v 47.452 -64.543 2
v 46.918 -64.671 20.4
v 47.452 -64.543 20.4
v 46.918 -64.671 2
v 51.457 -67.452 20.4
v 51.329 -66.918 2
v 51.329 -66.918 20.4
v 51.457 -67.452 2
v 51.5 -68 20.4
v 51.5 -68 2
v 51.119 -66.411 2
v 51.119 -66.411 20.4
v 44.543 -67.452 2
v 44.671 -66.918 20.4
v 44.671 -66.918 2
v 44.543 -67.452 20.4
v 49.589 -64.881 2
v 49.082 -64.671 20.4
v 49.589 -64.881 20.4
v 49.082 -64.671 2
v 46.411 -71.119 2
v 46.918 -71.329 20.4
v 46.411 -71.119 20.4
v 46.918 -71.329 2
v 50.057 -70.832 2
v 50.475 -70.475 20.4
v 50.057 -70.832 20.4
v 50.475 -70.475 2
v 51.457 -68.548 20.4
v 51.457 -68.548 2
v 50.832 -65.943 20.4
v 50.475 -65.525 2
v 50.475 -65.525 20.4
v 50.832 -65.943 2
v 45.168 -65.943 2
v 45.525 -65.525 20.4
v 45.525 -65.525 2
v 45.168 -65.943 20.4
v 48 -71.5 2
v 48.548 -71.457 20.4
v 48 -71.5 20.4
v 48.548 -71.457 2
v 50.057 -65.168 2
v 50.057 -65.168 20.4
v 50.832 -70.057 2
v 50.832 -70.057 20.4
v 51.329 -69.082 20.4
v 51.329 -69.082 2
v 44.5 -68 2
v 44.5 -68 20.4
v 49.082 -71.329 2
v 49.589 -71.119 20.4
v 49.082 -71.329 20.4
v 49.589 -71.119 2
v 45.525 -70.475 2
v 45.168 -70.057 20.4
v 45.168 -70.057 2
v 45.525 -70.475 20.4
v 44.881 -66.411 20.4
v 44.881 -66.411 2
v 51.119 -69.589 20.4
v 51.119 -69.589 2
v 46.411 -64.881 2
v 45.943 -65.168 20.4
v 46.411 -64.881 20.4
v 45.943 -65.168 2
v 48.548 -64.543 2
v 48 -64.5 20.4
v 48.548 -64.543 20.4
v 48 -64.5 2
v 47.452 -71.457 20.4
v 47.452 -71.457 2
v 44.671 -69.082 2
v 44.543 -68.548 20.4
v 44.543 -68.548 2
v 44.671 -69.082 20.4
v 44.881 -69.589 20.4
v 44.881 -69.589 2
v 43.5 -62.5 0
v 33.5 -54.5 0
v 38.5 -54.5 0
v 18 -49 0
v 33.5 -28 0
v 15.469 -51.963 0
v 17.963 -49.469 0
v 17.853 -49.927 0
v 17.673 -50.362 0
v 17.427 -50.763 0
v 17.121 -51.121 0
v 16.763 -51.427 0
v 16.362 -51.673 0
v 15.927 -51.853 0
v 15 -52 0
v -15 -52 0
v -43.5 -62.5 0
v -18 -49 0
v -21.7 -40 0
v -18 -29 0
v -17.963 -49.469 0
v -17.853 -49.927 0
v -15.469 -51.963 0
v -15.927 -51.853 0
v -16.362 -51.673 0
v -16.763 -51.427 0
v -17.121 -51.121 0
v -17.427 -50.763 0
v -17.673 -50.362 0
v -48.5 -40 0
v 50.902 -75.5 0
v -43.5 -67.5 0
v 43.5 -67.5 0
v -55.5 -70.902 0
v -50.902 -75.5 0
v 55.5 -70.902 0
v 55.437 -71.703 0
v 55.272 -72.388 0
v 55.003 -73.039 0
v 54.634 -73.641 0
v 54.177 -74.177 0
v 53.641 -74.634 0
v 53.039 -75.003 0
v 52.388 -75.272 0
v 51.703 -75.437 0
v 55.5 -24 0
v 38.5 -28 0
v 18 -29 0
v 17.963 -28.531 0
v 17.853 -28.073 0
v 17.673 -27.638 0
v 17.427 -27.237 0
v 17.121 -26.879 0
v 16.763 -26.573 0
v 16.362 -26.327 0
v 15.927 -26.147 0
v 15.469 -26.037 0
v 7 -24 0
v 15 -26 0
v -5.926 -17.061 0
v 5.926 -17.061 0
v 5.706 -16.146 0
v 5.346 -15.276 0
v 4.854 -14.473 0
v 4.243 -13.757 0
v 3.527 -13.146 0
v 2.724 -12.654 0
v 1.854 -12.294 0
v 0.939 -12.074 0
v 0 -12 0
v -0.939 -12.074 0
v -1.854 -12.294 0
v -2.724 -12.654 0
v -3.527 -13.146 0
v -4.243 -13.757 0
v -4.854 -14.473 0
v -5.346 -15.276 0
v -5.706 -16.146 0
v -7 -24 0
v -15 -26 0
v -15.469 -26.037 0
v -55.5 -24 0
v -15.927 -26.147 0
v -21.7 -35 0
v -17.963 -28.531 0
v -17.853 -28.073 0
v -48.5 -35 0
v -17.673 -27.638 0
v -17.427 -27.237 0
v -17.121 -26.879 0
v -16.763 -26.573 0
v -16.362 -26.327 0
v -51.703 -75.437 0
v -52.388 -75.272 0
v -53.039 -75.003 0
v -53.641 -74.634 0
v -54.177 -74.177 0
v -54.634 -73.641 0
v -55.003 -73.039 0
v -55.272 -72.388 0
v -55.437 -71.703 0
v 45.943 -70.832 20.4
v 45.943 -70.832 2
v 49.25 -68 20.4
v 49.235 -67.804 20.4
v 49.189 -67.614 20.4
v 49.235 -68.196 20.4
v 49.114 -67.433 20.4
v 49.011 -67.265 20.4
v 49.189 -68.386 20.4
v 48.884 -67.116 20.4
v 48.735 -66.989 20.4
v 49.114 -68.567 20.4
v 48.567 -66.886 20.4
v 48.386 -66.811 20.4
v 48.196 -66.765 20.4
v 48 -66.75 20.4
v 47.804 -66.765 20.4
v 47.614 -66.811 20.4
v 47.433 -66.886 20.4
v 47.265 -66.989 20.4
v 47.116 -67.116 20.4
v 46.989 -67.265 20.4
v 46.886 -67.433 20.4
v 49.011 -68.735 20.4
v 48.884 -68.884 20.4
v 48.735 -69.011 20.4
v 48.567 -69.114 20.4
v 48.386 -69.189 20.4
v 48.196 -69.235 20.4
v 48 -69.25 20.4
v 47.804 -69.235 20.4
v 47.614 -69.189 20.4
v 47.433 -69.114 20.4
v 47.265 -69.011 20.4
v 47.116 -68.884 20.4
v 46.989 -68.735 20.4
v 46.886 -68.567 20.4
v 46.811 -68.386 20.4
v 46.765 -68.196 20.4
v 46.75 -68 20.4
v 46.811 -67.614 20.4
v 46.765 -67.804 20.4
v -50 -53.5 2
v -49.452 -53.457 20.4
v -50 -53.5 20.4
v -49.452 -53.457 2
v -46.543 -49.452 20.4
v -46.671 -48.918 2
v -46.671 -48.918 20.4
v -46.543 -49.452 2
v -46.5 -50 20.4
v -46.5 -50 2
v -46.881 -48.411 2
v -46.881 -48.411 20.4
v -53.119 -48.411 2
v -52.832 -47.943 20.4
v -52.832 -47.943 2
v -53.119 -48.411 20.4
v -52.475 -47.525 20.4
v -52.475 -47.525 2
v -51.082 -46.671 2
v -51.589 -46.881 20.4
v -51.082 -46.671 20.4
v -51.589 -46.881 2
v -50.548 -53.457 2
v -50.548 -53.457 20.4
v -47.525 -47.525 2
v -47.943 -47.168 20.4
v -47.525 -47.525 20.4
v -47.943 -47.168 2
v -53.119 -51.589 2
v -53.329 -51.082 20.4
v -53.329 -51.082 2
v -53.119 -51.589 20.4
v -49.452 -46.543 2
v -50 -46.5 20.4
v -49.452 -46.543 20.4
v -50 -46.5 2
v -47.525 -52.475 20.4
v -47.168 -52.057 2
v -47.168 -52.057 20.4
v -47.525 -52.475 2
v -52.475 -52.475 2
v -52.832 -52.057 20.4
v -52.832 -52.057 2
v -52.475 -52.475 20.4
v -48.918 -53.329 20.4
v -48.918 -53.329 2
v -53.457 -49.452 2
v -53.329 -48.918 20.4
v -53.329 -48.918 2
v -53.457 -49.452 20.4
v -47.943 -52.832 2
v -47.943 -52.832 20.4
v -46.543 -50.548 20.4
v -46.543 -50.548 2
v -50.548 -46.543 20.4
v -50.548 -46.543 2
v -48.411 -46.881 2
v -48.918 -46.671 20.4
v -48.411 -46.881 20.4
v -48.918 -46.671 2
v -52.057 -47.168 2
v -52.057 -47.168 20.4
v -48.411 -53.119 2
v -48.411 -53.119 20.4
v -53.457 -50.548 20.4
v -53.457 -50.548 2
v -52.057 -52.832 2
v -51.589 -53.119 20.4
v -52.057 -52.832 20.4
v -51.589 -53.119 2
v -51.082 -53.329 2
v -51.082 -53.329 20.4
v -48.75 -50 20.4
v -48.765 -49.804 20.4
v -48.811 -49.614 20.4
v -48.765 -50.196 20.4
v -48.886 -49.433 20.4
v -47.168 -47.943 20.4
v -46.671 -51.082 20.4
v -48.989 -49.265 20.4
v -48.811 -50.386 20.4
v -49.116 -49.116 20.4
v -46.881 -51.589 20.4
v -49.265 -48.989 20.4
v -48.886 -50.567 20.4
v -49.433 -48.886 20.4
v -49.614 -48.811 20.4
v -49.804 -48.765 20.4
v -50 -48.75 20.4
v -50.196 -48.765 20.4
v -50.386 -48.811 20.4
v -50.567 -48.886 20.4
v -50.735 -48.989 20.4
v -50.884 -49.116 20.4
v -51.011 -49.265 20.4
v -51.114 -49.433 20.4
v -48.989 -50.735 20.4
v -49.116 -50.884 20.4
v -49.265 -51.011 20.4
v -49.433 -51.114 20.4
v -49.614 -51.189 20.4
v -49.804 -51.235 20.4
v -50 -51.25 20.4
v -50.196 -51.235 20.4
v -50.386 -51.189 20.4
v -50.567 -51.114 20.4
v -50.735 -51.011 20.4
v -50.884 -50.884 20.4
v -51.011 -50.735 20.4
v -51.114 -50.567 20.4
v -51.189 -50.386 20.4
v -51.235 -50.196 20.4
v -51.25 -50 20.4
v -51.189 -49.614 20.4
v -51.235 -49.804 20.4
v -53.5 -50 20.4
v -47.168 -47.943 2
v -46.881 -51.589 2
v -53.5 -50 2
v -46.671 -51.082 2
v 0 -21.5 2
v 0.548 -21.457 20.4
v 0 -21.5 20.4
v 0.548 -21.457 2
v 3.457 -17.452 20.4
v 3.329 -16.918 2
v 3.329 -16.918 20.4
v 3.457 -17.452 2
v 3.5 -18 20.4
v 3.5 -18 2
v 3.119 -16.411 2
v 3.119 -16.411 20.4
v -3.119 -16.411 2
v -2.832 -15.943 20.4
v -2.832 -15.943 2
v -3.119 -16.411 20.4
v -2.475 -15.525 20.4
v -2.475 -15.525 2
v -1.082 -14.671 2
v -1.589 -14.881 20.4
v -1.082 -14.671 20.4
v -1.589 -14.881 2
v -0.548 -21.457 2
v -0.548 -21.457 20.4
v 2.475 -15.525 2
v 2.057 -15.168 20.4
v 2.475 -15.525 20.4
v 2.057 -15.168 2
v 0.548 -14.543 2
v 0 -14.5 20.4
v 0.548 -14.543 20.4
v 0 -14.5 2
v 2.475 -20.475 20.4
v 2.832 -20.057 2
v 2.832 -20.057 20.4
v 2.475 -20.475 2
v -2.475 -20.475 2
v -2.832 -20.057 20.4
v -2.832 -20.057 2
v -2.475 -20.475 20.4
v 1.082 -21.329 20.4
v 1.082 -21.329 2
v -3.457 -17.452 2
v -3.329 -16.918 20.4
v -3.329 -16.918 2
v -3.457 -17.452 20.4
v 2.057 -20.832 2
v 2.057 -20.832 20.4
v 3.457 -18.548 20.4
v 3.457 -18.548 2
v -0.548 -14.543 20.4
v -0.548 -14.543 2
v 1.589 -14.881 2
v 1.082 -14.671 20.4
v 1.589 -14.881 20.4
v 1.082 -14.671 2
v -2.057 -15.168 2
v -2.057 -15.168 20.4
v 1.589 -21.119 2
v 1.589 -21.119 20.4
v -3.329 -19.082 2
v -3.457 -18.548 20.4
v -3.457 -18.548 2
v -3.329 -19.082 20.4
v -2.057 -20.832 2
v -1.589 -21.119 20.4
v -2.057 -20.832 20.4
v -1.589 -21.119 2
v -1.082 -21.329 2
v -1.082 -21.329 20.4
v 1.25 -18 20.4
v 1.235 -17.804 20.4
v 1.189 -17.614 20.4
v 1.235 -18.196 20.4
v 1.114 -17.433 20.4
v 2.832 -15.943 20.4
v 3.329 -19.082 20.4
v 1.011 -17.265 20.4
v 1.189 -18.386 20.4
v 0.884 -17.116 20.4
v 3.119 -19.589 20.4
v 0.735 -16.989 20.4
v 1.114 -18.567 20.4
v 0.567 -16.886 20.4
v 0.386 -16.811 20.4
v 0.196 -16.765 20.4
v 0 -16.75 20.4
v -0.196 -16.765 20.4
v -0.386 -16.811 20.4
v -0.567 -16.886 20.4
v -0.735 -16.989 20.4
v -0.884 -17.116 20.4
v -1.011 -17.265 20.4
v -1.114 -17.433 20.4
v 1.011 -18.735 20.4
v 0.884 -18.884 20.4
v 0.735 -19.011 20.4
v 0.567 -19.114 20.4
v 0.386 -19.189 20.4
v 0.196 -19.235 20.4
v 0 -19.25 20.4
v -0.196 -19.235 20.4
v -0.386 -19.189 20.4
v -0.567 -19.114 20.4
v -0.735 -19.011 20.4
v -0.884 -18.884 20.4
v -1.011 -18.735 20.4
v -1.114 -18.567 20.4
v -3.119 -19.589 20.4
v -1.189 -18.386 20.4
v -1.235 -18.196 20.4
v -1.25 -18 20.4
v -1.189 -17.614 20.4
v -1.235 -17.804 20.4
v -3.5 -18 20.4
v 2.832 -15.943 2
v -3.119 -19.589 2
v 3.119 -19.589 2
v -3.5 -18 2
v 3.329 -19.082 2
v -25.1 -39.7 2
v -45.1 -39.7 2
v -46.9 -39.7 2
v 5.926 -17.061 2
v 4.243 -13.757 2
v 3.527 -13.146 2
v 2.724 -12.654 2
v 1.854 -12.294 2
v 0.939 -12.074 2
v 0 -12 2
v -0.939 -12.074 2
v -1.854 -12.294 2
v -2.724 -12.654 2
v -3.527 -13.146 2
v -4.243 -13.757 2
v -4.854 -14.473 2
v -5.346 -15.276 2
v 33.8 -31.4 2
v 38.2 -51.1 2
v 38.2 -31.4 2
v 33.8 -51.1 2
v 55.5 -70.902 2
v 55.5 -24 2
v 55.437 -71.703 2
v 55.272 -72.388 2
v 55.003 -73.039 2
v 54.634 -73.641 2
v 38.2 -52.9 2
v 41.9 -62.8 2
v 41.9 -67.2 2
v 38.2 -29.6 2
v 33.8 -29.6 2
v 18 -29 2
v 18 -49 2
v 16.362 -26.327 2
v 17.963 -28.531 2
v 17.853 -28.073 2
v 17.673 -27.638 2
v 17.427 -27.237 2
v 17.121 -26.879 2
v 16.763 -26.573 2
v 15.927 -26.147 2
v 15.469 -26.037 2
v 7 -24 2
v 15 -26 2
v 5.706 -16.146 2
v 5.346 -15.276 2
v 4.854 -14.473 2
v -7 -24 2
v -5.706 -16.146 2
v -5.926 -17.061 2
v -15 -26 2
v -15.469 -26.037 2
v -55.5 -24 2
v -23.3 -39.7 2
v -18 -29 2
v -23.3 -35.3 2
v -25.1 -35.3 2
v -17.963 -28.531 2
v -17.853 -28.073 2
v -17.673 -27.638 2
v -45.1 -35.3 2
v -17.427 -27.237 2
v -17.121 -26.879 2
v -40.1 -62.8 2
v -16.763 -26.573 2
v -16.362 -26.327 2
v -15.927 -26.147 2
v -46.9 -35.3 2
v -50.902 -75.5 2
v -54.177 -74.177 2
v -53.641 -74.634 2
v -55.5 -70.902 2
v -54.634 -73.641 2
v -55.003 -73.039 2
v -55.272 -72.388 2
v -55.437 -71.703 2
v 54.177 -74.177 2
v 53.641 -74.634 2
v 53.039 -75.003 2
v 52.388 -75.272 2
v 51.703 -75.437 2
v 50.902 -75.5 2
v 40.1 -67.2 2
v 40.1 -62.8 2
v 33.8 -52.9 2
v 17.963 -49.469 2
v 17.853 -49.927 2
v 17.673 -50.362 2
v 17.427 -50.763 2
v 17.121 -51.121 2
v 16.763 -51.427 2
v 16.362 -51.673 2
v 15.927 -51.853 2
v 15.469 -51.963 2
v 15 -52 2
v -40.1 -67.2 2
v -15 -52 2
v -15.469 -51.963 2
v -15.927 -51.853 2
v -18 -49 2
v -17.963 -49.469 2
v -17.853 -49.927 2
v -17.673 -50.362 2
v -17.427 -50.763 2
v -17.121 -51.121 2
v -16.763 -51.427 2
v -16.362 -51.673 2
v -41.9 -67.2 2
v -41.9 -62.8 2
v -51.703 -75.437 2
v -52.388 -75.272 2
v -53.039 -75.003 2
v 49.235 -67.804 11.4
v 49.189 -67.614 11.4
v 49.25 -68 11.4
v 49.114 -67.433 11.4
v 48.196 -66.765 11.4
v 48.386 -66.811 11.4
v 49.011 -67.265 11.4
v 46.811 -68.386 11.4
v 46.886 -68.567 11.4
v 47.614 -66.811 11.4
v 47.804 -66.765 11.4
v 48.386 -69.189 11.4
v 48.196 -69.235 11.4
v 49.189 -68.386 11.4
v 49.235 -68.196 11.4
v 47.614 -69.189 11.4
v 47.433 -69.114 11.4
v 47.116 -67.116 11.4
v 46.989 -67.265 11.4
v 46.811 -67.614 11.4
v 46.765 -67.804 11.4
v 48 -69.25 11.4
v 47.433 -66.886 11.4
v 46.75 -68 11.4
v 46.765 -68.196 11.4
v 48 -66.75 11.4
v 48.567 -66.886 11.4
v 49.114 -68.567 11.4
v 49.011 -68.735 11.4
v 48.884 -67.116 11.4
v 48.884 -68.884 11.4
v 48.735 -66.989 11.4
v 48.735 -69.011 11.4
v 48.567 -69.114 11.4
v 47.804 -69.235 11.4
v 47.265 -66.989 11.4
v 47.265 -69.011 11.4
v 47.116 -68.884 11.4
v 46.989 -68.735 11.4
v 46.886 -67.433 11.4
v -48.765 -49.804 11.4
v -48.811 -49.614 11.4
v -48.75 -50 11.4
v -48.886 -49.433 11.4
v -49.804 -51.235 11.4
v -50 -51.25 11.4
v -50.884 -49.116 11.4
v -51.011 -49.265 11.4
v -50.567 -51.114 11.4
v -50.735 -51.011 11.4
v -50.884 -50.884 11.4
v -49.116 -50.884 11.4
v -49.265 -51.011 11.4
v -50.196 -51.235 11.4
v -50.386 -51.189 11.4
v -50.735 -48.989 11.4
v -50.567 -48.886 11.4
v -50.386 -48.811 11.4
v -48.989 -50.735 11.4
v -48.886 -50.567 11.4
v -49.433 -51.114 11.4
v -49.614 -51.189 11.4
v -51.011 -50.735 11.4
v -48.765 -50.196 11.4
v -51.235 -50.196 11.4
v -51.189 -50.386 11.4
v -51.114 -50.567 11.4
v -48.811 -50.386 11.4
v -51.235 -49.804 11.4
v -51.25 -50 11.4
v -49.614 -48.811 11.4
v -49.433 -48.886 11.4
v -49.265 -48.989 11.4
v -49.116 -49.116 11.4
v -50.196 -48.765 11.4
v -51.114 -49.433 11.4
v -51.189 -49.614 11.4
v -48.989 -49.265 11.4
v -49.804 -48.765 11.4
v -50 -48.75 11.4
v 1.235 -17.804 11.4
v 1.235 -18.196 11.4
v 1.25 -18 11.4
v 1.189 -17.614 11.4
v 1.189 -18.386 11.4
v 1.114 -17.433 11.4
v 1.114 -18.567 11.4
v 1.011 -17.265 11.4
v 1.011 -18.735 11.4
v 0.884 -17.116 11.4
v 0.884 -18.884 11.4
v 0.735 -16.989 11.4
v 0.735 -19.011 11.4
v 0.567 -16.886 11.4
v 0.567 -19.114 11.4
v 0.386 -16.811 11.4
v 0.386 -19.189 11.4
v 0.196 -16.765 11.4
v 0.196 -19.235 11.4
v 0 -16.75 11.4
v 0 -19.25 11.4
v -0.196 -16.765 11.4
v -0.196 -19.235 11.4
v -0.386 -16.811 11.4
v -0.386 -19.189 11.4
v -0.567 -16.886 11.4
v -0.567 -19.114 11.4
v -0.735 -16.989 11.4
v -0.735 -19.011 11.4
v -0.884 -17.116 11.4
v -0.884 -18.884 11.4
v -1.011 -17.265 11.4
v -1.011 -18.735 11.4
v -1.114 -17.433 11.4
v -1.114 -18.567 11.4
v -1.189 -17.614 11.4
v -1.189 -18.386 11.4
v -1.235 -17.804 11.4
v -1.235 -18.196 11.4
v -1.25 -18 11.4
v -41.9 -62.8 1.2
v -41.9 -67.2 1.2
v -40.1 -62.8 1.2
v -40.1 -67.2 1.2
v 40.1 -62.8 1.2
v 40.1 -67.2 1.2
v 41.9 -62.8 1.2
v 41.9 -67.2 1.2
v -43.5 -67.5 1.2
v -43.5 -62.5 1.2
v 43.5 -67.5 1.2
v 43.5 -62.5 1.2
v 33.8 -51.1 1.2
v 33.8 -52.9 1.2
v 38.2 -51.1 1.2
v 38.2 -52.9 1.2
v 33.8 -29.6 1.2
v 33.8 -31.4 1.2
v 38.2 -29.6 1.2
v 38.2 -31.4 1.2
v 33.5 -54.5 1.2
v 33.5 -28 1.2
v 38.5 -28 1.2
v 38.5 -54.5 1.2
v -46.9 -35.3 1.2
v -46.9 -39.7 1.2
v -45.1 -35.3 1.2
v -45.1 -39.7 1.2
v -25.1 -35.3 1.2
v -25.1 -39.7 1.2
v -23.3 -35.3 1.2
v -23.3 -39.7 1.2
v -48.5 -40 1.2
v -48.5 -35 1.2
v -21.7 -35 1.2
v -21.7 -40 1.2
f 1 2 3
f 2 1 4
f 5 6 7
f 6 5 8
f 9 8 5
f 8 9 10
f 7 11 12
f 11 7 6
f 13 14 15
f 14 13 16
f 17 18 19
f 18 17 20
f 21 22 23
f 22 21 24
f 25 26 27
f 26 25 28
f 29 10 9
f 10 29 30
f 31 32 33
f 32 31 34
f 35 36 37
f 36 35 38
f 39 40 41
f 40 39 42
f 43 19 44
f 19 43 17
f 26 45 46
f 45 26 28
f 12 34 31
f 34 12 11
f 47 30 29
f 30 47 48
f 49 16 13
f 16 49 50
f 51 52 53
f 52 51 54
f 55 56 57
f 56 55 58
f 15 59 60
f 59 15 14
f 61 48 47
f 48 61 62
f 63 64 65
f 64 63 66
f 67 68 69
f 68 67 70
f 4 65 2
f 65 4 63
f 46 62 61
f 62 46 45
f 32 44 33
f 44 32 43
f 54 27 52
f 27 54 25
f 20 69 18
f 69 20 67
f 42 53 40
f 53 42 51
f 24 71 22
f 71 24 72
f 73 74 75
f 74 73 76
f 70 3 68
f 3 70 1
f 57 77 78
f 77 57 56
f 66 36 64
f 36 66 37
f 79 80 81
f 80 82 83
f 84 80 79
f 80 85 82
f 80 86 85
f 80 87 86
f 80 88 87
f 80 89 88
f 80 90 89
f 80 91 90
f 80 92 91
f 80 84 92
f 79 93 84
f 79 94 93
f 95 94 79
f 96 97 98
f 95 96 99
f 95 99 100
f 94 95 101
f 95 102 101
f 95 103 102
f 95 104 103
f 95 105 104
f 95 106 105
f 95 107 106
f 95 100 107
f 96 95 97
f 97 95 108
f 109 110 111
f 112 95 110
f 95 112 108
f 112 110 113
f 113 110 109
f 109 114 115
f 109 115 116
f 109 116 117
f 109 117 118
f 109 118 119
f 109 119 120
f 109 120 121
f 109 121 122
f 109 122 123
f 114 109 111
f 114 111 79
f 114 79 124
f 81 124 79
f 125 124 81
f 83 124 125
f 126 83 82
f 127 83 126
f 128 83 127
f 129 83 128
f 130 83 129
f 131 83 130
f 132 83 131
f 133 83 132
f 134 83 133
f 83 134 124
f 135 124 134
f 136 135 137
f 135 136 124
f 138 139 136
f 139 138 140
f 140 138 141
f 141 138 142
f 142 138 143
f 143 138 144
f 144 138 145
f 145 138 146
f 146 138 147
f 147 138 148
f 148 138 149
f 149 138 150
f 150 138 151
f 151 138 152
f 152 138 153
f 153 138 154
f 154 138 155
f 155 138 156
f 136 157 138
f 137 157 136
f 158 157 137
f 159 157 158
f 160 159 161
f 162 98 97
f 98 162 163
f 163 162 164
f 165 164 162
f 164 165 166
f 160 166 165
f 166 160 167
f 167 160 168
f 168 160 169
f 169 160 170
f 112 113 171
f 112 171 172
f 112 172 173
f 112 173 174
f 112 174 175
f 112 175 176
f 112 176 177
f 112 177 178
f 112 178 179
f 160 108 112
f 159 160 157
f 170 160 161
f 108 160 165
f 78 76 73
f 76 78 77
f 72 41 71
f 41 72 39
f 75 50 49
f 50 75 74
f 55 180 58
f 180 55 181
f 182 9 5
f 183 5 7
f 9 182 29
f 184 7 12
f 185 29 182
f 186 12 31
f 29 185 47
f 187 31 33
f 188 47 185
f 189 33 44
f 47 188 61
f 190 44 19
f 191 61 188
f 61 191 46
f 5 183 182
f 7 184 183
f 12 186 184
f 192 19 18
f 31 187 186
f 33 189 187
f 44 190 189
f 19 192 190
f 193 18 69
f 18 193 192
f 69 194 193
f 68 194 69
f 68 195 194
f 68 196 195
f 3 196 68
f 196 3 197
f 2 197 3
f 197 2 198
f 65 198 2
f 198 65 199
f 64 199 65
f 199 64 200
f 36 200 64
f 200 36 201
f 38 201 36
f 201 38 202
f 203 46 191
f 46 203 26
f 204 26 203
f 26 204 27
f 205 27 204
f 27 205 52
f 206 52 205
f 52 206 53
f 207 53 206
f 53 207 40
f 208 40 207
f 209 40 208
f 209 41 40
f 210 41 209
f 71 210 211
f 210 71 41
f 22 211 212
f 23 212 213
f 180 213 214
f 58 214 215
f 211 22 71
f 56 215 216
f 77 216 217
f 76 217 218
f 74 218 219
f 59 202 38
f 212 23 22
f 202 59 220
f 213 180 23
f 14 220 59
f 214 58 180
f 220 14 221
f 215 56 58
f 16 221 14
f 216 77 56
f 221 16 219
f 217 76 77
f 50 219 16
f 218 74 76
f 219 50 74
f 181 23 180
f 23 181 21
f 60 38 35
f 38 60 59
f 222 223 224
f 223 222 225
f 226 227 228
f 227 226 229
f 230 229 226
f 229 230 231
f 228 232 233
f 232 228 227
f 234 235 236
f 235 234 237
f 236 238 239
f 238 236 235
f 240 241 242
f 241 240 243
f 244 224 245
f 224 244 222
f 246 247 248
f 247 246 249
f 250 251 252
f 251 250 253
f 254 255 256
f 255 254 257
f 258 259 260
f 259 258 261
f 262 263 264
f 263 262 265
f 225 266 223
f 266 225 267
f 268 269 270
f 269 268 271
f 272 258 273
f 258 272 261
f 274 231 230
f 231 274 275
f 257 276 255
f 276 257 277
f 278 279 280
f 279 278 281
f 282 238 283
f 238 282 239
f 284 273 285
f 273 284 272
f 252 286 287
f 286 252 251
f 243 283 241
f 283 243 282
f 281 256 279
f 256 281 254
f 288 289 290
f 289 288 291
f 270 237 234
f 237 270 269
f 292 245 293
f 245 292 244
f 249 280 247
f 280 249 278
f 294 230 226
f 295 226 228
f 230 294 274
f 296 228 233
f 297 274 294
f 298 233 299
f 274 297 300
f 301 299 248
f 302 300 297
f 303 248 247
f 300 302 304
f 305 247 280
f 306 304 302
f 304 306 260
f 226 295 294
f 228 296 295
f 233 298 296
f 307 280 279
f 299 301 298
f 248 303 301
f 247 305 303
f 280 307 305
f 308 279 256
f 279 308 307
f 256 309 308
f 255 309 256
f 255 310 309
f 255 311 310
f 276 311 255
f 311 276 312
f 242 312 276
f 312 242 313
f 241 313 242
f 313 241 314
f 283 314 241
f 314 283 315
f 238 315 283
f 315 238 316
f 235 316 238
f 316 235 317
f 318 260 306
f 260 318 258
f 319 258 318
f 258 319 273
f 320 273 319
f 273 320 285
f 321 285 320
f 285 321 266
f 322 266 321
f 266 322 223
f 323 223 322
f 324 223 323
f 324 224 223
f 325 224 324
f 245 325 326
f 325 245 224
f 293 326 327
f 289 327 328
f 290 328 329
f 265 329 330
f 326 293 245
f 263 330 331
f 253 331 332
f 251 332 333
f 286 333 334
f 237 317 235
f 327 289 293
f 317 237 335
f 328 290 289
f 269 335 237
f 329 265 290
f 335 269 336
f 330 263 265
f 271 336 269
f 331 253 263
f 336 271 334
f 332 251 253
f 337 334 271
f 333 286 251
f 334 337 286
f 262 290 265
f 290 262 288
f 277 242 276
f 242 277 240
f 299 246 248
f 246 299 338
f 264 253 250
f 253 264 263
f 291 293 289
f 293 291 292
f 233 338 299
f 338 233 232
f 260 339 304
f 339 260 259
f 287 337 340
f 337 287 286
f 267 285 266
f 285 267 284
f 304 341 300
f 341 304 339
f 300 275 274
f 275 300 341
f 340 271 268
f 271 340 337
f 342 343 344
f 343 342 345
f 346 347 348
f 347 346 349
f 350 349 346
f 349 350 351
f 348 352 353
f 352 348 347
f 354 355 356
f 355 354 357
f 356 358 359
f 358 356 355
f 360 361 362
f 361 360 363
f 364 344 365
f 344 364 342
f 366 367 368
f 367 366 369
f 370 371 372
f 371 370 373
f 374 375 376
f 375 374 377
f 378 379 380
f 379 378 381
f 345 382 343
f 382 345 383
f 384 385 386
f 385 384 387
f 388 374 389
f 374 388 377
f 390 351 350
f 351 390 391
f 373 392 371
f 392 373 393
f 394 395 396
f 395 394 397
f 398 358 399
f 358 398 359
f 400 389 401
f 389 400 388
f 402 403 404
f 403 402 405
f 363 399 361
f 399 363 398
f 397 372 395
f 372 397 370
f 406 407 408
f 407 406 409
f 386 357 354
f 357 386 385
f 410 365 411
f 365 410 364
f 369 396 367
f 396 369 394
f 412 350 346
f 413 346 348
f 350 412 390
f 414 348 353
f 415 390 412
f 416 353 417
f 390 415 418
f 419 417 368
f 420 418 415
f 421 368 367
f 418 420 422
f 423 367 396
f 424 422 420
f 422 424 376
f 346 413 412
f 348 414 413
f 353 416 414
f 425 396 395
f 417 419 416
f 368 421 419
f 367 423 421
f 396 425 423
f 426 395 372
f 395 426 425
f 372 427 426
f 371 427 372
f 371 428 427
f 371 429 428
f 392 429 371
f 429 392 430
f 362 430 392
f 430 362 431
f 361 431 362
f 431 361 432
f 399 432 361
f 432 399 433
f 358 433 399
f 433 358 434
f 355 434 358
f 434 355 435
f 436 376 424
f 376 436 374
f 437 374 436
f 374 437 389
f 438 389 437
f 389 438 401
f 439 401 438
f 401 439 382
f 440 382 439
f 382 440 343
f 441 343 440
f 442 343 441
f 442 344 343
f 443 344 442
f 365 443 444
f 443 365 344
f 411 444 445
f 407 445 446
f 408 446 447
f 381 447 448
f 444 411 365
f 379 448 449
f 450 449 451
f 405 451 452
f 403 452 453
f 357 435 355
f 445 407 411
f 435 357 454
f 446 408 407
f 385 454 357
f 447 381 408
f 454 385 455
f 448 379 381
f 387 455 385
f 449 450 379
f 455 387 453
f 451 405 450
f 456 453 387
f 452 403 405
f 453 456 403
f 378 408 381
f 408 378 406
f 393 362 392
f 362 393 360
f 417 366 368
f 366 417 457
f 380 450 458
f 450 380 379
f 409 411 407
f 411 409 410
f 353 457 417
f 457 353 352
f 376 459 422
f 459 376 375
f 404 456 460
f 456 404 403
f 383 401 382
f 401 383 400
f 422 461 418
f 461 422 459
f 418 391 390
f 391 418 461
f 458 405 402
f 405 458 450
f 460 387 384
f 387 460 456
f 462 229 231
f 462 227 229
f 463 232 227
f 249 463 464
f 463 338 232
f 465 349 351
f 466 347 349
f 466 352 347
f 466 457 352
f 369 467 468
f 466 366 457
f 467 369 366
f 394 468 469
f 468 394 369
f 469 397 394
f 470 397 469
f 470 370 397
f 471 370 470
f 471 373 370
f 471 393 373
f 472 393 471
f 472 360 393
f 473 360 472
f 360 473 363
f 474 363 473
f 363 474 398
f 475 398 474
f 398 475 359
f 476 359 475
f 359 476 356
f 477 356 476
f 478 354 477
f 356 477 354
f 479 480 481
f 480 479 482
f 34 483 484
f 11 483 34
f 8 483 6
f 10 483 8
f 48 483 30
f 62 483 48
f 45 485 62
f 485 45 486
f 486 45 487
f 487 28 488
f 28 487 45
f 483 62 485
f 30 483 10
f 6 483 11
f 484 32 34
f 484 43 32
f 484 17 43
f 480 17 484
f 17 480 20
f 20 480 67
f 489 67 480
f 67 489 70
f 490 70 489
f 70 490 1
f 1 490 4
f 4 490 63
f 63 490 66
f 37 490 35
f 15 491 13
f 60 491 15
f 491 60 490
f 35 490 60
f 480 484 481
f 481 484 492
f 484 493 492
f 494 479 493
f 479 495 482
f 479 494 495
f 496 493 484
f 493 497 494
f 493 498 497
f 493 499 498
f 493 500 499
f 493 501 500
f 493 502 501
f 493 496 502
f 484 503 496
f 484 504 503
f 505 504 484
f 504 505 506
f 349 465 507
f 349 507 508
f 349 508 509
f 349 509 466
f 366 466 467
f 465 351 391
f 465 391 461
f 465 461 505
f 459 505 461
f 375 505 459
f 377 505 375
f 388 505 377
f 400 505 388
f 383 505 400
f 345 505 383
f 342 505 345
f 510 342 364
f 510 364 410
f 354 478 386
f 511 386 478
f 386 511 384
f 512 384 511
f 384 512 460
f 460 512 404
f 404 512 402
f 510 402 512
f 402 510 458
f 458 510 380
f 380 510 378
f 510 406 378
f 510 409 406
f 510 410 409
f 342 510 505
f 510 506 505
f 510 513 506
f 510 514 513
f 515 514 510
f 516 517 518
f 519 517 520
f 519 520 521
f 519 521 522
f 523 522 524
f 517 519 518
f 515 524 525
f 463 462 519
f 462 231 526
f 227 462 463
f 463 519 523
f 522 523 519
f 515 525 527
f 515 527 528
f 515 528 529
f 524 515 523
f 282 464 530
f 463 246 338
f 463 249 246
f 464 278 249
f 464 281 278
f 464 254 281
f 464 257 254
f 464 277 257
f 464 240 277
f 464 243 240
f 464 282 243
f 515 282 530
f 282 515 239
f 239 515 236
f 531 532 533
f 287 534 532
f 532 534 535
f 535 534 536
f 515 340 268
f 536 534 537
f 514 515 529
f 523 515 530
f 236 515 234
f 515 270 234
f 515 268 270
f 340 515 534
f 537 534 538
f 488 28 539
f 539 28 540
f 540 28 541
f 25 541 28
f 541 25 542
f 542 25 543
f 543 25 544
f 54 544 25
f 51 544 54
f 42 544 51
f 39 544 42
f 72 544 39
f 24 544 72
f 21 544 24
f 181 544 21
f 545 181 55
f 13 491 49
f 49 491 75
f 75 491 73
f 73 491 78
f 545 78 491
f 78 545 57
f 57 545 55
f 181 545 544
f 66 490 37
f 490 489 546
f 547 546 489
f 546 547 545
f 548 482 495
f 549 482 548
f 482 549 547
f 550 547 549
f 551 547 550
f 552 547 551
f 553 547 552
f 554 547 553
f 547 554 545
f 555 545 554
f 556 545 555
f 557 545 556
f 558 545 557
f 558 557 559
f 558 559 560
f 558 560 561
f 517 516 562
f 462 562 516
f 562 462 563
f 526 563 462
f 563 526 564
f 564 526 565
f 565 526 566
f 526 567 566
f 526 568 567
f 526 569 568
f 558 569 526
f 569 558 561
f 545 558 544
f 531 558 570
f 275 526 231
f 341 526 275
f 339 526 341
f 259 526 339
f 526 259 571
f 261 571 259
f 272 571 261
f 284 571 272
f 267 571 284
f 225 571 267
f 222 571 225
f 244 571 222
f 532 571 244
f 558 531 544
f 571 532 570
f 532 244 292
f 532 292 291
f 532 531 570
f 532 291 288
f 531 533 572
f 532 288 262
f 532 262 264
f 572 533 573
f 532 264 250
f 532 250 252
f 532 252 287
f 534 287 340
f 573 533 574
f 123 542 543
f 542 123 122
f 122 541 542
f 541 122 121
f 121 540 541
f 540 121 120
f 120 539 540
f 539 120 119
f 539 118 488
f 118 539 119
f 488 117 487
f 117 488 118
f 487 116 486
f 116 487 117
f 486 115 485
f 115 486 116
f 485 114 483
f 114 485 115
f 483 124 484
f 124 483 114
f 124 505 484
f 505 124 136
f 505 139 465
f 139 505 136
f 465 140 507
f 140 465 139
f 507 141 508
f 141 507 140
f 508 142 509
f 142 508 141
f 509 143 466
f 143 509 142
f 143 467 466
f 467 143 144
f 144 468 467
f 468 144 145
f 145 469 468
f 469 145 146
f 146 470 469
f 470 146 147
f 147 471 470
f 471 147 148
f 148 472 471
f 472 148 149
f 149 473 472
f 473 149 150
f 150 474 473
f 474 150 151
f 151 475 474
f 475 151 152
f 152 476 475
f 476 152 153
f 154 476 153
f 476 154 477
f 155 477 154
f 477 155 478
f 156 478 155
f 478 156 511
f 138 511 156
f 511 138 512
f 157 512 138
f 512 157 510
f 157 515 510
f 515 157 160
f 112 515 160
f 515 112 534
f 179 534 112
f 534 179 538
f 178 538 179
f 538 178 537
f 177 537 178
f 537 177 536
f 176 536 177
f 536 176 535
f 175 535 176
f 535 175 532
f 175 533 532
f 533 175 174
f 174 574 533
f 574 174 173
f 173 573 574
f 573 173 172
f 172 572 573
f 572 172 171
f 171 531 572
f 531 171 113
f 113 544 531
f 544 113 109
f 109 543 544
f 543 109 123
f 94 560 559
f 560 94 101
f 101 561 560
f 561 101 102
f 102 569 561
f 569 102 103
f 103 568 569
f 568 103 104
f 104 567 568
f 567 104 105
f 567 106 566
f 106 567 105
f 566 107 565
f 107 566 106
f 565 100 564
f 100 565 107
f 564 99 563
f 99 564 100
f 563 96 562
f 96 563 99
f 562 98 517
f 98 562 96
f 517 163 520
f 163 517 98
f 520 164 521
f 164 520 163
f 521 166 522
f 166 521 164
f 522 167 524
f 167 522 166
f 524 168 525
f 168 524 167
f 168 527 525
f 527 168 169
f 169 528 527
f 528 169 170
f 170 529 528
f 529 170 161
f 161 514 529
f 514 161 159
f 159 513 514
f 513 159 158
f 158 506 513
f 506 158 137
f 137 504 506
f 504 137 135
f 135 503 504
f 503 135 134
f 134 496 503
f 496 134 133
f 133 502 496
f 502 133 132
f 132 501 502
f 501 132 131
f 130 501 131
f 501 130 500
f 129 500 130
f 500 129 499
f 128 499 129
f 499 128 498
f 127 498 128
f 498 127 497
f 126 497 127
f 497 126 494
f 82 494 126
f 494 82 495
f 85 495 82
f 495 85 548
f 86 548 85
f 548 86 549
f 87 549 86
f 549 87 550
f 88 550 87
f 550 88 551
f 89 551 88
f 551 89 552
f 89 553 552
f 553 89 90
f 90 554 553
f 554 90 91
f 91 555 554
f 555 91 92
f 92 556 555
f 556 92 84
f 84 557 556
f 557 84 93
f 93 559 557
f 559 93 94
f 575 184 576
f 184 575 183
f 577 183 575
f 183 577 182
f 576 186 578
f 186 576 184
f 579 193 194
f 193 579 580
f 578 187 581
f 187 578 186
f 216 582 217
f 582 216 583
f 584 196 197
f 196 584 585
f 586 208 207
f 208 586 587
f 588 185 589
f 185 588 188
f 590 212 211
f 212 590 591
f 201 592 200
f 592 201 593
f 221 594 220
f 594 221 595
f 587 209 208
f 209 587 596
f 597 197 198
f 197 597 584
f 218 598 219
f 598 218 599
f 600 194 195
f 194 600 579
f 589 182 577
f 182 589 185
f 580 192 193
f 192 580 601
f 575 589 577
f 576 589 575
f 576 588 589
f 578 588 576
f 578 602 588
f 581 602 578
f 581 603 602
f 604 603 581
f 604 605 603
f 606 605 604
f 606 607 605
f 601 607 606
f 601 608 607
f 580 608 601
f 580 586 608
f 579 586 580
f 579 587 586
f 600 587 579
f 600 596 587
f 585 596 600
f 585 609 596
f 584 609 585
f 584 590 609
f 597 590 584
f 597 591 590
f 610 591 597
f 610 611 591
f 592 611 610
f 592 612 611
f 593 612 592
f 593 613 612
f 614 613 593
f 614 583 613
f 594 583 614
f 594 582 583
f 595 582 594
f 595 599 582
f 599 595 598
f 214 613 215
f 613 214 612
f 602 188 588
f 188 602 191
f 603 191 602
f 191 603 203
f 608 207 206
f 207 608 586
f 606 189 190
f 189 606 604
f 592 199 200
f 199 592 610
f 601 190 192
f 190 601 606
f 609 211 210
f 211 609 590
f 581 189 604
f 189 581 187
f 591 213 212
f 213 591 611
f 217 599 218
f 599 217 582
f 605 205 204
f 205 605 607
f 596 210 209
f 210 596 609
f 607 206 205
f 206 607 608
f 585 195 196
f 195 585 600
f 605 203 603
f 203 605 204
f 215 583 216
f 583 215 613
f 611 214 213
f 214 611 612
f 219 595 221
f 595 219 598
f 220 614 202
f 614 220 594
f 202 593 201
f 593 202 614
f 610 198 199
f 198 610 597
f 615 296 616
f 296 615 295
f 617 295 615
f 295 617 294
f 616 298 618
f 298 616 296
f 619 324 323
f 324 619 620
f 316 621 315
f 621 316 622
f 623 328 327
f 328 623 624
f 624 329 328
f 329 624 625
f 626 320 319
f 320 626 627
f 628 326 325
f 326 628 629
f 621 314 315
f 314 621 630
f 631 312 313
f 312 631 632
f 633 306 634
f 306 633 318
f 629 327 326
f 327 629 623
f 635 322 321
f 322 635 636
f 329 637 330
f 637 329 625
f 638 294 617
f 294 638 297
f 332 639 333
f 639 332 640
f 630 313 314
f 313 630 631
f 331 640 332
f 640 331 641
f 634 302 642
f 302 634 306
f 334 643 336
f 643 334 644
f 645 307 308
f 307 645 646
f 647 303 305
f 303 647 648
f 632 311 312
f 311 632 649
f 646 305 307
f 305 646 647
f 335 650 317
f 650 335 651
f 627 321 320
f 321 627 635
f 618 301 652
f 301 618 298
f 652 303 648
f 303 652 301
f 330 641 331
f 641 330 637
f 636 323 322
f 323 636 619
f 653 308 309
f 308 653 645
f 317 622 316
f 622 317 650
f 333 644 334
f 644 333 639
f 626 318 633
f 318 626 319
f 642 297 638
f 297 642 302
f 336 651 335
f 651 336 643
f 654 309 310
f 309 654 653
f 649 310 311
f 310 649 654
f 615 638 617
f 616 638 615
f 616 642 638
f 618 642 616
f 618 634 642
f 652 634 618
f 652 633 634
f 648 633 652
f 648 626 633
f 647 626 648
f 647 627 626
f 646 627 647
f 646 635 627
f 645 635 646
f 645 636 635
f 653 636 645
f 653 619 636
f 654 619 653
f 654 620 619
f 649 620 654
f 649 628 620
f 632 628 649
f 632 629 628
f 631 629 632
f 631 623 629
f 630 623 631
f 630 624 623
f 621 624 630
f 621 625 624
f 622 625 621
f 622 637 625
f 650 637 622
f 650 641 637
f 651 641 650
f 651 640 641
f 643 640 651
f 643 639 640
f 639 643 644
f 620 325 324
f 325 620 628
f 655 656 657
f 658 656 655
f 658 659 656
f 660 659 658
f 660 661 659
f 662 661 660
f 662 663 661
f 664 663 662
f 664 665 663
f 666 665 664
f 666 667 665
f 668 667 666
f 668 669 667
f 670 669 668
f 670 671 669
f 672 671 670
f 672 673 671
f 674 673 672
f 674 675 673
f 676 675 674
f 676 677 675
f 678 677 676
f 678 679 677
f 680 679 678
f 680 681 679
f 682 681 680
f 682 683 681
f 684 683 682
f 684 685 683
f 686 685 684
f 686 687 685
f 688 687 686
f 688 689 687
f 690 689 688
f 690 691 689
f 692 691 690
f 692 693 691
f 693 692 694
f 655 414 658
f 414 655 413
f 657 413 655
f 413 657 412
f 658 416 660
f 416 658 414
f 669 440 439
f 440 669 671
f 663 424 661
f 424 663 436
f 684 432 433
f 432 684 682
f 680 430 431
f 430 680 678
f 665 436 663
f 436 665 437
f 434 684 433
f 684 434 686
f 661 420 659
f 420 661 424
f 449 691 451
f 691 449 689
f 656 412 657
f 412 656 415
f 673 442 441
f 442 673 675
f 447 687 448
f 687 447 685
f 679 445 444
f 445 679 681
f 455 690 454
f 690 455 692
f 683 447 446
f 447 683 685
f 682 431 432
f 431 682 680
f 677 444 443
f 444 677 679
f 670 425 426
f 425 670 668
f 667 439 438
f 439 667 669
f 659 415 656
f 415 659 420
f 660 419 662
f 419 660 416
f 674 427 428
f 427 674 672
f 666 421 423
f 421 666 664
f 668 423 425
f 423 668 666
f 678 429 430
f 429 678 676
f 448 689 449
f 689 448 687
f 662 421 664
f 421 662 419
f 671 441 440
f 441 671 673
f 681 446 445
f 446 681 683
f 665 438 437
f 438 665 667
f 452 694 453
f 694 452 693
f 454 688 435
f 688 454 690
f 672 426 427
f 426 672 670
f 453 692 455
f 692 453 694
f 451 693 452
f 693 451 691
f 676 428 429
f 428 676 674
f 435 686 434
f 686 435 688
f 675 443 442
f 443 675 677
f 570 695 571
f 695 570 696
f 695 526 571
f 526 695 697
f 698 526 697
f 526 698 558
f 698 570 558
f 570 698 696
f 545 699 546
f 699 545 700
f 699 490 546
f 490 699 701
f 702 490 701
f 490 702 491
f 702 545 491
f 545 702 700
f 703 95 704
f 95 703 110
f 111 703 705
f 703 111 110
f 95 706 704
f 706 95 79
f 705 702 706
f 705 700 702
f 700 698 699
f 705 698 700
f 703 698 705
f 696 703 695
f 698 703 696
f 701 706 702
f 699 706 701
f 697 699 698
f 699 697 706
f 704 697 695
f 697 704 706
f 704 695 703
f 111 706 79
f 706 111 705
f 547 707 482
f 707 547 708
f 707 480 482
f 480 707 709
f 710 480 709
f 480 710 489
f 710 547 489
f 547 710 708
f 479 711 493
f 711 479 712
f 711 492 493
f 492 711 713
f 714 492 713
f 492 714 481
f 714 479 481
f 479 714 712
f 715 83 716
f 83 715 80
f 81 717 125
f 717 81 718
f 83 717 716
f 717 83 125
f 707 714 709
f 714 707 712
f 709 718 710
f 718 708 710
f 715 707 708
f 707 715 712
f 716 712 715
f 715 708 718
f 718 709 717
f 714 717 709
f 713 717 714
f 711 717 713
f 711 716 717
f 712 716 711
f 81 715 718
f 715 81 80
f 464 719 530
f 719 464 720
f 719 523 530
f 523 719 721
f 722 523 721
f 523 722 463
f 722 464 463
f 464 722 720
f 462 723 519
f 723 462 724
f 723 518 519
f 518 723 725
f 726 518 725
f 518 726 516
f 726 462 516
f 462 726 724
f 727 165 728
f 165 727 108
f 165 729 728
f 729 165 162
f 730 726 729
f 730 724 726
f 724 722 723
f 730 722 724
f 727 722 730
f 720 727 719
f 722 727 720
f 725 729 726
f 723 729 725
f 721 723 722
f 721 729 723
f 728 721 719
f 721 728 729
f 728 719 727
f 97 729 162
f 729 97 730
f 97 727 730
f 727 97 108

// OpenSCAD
include <../lib/hanging-solar-node-lib.scad>;
$fn = 40;
card();
